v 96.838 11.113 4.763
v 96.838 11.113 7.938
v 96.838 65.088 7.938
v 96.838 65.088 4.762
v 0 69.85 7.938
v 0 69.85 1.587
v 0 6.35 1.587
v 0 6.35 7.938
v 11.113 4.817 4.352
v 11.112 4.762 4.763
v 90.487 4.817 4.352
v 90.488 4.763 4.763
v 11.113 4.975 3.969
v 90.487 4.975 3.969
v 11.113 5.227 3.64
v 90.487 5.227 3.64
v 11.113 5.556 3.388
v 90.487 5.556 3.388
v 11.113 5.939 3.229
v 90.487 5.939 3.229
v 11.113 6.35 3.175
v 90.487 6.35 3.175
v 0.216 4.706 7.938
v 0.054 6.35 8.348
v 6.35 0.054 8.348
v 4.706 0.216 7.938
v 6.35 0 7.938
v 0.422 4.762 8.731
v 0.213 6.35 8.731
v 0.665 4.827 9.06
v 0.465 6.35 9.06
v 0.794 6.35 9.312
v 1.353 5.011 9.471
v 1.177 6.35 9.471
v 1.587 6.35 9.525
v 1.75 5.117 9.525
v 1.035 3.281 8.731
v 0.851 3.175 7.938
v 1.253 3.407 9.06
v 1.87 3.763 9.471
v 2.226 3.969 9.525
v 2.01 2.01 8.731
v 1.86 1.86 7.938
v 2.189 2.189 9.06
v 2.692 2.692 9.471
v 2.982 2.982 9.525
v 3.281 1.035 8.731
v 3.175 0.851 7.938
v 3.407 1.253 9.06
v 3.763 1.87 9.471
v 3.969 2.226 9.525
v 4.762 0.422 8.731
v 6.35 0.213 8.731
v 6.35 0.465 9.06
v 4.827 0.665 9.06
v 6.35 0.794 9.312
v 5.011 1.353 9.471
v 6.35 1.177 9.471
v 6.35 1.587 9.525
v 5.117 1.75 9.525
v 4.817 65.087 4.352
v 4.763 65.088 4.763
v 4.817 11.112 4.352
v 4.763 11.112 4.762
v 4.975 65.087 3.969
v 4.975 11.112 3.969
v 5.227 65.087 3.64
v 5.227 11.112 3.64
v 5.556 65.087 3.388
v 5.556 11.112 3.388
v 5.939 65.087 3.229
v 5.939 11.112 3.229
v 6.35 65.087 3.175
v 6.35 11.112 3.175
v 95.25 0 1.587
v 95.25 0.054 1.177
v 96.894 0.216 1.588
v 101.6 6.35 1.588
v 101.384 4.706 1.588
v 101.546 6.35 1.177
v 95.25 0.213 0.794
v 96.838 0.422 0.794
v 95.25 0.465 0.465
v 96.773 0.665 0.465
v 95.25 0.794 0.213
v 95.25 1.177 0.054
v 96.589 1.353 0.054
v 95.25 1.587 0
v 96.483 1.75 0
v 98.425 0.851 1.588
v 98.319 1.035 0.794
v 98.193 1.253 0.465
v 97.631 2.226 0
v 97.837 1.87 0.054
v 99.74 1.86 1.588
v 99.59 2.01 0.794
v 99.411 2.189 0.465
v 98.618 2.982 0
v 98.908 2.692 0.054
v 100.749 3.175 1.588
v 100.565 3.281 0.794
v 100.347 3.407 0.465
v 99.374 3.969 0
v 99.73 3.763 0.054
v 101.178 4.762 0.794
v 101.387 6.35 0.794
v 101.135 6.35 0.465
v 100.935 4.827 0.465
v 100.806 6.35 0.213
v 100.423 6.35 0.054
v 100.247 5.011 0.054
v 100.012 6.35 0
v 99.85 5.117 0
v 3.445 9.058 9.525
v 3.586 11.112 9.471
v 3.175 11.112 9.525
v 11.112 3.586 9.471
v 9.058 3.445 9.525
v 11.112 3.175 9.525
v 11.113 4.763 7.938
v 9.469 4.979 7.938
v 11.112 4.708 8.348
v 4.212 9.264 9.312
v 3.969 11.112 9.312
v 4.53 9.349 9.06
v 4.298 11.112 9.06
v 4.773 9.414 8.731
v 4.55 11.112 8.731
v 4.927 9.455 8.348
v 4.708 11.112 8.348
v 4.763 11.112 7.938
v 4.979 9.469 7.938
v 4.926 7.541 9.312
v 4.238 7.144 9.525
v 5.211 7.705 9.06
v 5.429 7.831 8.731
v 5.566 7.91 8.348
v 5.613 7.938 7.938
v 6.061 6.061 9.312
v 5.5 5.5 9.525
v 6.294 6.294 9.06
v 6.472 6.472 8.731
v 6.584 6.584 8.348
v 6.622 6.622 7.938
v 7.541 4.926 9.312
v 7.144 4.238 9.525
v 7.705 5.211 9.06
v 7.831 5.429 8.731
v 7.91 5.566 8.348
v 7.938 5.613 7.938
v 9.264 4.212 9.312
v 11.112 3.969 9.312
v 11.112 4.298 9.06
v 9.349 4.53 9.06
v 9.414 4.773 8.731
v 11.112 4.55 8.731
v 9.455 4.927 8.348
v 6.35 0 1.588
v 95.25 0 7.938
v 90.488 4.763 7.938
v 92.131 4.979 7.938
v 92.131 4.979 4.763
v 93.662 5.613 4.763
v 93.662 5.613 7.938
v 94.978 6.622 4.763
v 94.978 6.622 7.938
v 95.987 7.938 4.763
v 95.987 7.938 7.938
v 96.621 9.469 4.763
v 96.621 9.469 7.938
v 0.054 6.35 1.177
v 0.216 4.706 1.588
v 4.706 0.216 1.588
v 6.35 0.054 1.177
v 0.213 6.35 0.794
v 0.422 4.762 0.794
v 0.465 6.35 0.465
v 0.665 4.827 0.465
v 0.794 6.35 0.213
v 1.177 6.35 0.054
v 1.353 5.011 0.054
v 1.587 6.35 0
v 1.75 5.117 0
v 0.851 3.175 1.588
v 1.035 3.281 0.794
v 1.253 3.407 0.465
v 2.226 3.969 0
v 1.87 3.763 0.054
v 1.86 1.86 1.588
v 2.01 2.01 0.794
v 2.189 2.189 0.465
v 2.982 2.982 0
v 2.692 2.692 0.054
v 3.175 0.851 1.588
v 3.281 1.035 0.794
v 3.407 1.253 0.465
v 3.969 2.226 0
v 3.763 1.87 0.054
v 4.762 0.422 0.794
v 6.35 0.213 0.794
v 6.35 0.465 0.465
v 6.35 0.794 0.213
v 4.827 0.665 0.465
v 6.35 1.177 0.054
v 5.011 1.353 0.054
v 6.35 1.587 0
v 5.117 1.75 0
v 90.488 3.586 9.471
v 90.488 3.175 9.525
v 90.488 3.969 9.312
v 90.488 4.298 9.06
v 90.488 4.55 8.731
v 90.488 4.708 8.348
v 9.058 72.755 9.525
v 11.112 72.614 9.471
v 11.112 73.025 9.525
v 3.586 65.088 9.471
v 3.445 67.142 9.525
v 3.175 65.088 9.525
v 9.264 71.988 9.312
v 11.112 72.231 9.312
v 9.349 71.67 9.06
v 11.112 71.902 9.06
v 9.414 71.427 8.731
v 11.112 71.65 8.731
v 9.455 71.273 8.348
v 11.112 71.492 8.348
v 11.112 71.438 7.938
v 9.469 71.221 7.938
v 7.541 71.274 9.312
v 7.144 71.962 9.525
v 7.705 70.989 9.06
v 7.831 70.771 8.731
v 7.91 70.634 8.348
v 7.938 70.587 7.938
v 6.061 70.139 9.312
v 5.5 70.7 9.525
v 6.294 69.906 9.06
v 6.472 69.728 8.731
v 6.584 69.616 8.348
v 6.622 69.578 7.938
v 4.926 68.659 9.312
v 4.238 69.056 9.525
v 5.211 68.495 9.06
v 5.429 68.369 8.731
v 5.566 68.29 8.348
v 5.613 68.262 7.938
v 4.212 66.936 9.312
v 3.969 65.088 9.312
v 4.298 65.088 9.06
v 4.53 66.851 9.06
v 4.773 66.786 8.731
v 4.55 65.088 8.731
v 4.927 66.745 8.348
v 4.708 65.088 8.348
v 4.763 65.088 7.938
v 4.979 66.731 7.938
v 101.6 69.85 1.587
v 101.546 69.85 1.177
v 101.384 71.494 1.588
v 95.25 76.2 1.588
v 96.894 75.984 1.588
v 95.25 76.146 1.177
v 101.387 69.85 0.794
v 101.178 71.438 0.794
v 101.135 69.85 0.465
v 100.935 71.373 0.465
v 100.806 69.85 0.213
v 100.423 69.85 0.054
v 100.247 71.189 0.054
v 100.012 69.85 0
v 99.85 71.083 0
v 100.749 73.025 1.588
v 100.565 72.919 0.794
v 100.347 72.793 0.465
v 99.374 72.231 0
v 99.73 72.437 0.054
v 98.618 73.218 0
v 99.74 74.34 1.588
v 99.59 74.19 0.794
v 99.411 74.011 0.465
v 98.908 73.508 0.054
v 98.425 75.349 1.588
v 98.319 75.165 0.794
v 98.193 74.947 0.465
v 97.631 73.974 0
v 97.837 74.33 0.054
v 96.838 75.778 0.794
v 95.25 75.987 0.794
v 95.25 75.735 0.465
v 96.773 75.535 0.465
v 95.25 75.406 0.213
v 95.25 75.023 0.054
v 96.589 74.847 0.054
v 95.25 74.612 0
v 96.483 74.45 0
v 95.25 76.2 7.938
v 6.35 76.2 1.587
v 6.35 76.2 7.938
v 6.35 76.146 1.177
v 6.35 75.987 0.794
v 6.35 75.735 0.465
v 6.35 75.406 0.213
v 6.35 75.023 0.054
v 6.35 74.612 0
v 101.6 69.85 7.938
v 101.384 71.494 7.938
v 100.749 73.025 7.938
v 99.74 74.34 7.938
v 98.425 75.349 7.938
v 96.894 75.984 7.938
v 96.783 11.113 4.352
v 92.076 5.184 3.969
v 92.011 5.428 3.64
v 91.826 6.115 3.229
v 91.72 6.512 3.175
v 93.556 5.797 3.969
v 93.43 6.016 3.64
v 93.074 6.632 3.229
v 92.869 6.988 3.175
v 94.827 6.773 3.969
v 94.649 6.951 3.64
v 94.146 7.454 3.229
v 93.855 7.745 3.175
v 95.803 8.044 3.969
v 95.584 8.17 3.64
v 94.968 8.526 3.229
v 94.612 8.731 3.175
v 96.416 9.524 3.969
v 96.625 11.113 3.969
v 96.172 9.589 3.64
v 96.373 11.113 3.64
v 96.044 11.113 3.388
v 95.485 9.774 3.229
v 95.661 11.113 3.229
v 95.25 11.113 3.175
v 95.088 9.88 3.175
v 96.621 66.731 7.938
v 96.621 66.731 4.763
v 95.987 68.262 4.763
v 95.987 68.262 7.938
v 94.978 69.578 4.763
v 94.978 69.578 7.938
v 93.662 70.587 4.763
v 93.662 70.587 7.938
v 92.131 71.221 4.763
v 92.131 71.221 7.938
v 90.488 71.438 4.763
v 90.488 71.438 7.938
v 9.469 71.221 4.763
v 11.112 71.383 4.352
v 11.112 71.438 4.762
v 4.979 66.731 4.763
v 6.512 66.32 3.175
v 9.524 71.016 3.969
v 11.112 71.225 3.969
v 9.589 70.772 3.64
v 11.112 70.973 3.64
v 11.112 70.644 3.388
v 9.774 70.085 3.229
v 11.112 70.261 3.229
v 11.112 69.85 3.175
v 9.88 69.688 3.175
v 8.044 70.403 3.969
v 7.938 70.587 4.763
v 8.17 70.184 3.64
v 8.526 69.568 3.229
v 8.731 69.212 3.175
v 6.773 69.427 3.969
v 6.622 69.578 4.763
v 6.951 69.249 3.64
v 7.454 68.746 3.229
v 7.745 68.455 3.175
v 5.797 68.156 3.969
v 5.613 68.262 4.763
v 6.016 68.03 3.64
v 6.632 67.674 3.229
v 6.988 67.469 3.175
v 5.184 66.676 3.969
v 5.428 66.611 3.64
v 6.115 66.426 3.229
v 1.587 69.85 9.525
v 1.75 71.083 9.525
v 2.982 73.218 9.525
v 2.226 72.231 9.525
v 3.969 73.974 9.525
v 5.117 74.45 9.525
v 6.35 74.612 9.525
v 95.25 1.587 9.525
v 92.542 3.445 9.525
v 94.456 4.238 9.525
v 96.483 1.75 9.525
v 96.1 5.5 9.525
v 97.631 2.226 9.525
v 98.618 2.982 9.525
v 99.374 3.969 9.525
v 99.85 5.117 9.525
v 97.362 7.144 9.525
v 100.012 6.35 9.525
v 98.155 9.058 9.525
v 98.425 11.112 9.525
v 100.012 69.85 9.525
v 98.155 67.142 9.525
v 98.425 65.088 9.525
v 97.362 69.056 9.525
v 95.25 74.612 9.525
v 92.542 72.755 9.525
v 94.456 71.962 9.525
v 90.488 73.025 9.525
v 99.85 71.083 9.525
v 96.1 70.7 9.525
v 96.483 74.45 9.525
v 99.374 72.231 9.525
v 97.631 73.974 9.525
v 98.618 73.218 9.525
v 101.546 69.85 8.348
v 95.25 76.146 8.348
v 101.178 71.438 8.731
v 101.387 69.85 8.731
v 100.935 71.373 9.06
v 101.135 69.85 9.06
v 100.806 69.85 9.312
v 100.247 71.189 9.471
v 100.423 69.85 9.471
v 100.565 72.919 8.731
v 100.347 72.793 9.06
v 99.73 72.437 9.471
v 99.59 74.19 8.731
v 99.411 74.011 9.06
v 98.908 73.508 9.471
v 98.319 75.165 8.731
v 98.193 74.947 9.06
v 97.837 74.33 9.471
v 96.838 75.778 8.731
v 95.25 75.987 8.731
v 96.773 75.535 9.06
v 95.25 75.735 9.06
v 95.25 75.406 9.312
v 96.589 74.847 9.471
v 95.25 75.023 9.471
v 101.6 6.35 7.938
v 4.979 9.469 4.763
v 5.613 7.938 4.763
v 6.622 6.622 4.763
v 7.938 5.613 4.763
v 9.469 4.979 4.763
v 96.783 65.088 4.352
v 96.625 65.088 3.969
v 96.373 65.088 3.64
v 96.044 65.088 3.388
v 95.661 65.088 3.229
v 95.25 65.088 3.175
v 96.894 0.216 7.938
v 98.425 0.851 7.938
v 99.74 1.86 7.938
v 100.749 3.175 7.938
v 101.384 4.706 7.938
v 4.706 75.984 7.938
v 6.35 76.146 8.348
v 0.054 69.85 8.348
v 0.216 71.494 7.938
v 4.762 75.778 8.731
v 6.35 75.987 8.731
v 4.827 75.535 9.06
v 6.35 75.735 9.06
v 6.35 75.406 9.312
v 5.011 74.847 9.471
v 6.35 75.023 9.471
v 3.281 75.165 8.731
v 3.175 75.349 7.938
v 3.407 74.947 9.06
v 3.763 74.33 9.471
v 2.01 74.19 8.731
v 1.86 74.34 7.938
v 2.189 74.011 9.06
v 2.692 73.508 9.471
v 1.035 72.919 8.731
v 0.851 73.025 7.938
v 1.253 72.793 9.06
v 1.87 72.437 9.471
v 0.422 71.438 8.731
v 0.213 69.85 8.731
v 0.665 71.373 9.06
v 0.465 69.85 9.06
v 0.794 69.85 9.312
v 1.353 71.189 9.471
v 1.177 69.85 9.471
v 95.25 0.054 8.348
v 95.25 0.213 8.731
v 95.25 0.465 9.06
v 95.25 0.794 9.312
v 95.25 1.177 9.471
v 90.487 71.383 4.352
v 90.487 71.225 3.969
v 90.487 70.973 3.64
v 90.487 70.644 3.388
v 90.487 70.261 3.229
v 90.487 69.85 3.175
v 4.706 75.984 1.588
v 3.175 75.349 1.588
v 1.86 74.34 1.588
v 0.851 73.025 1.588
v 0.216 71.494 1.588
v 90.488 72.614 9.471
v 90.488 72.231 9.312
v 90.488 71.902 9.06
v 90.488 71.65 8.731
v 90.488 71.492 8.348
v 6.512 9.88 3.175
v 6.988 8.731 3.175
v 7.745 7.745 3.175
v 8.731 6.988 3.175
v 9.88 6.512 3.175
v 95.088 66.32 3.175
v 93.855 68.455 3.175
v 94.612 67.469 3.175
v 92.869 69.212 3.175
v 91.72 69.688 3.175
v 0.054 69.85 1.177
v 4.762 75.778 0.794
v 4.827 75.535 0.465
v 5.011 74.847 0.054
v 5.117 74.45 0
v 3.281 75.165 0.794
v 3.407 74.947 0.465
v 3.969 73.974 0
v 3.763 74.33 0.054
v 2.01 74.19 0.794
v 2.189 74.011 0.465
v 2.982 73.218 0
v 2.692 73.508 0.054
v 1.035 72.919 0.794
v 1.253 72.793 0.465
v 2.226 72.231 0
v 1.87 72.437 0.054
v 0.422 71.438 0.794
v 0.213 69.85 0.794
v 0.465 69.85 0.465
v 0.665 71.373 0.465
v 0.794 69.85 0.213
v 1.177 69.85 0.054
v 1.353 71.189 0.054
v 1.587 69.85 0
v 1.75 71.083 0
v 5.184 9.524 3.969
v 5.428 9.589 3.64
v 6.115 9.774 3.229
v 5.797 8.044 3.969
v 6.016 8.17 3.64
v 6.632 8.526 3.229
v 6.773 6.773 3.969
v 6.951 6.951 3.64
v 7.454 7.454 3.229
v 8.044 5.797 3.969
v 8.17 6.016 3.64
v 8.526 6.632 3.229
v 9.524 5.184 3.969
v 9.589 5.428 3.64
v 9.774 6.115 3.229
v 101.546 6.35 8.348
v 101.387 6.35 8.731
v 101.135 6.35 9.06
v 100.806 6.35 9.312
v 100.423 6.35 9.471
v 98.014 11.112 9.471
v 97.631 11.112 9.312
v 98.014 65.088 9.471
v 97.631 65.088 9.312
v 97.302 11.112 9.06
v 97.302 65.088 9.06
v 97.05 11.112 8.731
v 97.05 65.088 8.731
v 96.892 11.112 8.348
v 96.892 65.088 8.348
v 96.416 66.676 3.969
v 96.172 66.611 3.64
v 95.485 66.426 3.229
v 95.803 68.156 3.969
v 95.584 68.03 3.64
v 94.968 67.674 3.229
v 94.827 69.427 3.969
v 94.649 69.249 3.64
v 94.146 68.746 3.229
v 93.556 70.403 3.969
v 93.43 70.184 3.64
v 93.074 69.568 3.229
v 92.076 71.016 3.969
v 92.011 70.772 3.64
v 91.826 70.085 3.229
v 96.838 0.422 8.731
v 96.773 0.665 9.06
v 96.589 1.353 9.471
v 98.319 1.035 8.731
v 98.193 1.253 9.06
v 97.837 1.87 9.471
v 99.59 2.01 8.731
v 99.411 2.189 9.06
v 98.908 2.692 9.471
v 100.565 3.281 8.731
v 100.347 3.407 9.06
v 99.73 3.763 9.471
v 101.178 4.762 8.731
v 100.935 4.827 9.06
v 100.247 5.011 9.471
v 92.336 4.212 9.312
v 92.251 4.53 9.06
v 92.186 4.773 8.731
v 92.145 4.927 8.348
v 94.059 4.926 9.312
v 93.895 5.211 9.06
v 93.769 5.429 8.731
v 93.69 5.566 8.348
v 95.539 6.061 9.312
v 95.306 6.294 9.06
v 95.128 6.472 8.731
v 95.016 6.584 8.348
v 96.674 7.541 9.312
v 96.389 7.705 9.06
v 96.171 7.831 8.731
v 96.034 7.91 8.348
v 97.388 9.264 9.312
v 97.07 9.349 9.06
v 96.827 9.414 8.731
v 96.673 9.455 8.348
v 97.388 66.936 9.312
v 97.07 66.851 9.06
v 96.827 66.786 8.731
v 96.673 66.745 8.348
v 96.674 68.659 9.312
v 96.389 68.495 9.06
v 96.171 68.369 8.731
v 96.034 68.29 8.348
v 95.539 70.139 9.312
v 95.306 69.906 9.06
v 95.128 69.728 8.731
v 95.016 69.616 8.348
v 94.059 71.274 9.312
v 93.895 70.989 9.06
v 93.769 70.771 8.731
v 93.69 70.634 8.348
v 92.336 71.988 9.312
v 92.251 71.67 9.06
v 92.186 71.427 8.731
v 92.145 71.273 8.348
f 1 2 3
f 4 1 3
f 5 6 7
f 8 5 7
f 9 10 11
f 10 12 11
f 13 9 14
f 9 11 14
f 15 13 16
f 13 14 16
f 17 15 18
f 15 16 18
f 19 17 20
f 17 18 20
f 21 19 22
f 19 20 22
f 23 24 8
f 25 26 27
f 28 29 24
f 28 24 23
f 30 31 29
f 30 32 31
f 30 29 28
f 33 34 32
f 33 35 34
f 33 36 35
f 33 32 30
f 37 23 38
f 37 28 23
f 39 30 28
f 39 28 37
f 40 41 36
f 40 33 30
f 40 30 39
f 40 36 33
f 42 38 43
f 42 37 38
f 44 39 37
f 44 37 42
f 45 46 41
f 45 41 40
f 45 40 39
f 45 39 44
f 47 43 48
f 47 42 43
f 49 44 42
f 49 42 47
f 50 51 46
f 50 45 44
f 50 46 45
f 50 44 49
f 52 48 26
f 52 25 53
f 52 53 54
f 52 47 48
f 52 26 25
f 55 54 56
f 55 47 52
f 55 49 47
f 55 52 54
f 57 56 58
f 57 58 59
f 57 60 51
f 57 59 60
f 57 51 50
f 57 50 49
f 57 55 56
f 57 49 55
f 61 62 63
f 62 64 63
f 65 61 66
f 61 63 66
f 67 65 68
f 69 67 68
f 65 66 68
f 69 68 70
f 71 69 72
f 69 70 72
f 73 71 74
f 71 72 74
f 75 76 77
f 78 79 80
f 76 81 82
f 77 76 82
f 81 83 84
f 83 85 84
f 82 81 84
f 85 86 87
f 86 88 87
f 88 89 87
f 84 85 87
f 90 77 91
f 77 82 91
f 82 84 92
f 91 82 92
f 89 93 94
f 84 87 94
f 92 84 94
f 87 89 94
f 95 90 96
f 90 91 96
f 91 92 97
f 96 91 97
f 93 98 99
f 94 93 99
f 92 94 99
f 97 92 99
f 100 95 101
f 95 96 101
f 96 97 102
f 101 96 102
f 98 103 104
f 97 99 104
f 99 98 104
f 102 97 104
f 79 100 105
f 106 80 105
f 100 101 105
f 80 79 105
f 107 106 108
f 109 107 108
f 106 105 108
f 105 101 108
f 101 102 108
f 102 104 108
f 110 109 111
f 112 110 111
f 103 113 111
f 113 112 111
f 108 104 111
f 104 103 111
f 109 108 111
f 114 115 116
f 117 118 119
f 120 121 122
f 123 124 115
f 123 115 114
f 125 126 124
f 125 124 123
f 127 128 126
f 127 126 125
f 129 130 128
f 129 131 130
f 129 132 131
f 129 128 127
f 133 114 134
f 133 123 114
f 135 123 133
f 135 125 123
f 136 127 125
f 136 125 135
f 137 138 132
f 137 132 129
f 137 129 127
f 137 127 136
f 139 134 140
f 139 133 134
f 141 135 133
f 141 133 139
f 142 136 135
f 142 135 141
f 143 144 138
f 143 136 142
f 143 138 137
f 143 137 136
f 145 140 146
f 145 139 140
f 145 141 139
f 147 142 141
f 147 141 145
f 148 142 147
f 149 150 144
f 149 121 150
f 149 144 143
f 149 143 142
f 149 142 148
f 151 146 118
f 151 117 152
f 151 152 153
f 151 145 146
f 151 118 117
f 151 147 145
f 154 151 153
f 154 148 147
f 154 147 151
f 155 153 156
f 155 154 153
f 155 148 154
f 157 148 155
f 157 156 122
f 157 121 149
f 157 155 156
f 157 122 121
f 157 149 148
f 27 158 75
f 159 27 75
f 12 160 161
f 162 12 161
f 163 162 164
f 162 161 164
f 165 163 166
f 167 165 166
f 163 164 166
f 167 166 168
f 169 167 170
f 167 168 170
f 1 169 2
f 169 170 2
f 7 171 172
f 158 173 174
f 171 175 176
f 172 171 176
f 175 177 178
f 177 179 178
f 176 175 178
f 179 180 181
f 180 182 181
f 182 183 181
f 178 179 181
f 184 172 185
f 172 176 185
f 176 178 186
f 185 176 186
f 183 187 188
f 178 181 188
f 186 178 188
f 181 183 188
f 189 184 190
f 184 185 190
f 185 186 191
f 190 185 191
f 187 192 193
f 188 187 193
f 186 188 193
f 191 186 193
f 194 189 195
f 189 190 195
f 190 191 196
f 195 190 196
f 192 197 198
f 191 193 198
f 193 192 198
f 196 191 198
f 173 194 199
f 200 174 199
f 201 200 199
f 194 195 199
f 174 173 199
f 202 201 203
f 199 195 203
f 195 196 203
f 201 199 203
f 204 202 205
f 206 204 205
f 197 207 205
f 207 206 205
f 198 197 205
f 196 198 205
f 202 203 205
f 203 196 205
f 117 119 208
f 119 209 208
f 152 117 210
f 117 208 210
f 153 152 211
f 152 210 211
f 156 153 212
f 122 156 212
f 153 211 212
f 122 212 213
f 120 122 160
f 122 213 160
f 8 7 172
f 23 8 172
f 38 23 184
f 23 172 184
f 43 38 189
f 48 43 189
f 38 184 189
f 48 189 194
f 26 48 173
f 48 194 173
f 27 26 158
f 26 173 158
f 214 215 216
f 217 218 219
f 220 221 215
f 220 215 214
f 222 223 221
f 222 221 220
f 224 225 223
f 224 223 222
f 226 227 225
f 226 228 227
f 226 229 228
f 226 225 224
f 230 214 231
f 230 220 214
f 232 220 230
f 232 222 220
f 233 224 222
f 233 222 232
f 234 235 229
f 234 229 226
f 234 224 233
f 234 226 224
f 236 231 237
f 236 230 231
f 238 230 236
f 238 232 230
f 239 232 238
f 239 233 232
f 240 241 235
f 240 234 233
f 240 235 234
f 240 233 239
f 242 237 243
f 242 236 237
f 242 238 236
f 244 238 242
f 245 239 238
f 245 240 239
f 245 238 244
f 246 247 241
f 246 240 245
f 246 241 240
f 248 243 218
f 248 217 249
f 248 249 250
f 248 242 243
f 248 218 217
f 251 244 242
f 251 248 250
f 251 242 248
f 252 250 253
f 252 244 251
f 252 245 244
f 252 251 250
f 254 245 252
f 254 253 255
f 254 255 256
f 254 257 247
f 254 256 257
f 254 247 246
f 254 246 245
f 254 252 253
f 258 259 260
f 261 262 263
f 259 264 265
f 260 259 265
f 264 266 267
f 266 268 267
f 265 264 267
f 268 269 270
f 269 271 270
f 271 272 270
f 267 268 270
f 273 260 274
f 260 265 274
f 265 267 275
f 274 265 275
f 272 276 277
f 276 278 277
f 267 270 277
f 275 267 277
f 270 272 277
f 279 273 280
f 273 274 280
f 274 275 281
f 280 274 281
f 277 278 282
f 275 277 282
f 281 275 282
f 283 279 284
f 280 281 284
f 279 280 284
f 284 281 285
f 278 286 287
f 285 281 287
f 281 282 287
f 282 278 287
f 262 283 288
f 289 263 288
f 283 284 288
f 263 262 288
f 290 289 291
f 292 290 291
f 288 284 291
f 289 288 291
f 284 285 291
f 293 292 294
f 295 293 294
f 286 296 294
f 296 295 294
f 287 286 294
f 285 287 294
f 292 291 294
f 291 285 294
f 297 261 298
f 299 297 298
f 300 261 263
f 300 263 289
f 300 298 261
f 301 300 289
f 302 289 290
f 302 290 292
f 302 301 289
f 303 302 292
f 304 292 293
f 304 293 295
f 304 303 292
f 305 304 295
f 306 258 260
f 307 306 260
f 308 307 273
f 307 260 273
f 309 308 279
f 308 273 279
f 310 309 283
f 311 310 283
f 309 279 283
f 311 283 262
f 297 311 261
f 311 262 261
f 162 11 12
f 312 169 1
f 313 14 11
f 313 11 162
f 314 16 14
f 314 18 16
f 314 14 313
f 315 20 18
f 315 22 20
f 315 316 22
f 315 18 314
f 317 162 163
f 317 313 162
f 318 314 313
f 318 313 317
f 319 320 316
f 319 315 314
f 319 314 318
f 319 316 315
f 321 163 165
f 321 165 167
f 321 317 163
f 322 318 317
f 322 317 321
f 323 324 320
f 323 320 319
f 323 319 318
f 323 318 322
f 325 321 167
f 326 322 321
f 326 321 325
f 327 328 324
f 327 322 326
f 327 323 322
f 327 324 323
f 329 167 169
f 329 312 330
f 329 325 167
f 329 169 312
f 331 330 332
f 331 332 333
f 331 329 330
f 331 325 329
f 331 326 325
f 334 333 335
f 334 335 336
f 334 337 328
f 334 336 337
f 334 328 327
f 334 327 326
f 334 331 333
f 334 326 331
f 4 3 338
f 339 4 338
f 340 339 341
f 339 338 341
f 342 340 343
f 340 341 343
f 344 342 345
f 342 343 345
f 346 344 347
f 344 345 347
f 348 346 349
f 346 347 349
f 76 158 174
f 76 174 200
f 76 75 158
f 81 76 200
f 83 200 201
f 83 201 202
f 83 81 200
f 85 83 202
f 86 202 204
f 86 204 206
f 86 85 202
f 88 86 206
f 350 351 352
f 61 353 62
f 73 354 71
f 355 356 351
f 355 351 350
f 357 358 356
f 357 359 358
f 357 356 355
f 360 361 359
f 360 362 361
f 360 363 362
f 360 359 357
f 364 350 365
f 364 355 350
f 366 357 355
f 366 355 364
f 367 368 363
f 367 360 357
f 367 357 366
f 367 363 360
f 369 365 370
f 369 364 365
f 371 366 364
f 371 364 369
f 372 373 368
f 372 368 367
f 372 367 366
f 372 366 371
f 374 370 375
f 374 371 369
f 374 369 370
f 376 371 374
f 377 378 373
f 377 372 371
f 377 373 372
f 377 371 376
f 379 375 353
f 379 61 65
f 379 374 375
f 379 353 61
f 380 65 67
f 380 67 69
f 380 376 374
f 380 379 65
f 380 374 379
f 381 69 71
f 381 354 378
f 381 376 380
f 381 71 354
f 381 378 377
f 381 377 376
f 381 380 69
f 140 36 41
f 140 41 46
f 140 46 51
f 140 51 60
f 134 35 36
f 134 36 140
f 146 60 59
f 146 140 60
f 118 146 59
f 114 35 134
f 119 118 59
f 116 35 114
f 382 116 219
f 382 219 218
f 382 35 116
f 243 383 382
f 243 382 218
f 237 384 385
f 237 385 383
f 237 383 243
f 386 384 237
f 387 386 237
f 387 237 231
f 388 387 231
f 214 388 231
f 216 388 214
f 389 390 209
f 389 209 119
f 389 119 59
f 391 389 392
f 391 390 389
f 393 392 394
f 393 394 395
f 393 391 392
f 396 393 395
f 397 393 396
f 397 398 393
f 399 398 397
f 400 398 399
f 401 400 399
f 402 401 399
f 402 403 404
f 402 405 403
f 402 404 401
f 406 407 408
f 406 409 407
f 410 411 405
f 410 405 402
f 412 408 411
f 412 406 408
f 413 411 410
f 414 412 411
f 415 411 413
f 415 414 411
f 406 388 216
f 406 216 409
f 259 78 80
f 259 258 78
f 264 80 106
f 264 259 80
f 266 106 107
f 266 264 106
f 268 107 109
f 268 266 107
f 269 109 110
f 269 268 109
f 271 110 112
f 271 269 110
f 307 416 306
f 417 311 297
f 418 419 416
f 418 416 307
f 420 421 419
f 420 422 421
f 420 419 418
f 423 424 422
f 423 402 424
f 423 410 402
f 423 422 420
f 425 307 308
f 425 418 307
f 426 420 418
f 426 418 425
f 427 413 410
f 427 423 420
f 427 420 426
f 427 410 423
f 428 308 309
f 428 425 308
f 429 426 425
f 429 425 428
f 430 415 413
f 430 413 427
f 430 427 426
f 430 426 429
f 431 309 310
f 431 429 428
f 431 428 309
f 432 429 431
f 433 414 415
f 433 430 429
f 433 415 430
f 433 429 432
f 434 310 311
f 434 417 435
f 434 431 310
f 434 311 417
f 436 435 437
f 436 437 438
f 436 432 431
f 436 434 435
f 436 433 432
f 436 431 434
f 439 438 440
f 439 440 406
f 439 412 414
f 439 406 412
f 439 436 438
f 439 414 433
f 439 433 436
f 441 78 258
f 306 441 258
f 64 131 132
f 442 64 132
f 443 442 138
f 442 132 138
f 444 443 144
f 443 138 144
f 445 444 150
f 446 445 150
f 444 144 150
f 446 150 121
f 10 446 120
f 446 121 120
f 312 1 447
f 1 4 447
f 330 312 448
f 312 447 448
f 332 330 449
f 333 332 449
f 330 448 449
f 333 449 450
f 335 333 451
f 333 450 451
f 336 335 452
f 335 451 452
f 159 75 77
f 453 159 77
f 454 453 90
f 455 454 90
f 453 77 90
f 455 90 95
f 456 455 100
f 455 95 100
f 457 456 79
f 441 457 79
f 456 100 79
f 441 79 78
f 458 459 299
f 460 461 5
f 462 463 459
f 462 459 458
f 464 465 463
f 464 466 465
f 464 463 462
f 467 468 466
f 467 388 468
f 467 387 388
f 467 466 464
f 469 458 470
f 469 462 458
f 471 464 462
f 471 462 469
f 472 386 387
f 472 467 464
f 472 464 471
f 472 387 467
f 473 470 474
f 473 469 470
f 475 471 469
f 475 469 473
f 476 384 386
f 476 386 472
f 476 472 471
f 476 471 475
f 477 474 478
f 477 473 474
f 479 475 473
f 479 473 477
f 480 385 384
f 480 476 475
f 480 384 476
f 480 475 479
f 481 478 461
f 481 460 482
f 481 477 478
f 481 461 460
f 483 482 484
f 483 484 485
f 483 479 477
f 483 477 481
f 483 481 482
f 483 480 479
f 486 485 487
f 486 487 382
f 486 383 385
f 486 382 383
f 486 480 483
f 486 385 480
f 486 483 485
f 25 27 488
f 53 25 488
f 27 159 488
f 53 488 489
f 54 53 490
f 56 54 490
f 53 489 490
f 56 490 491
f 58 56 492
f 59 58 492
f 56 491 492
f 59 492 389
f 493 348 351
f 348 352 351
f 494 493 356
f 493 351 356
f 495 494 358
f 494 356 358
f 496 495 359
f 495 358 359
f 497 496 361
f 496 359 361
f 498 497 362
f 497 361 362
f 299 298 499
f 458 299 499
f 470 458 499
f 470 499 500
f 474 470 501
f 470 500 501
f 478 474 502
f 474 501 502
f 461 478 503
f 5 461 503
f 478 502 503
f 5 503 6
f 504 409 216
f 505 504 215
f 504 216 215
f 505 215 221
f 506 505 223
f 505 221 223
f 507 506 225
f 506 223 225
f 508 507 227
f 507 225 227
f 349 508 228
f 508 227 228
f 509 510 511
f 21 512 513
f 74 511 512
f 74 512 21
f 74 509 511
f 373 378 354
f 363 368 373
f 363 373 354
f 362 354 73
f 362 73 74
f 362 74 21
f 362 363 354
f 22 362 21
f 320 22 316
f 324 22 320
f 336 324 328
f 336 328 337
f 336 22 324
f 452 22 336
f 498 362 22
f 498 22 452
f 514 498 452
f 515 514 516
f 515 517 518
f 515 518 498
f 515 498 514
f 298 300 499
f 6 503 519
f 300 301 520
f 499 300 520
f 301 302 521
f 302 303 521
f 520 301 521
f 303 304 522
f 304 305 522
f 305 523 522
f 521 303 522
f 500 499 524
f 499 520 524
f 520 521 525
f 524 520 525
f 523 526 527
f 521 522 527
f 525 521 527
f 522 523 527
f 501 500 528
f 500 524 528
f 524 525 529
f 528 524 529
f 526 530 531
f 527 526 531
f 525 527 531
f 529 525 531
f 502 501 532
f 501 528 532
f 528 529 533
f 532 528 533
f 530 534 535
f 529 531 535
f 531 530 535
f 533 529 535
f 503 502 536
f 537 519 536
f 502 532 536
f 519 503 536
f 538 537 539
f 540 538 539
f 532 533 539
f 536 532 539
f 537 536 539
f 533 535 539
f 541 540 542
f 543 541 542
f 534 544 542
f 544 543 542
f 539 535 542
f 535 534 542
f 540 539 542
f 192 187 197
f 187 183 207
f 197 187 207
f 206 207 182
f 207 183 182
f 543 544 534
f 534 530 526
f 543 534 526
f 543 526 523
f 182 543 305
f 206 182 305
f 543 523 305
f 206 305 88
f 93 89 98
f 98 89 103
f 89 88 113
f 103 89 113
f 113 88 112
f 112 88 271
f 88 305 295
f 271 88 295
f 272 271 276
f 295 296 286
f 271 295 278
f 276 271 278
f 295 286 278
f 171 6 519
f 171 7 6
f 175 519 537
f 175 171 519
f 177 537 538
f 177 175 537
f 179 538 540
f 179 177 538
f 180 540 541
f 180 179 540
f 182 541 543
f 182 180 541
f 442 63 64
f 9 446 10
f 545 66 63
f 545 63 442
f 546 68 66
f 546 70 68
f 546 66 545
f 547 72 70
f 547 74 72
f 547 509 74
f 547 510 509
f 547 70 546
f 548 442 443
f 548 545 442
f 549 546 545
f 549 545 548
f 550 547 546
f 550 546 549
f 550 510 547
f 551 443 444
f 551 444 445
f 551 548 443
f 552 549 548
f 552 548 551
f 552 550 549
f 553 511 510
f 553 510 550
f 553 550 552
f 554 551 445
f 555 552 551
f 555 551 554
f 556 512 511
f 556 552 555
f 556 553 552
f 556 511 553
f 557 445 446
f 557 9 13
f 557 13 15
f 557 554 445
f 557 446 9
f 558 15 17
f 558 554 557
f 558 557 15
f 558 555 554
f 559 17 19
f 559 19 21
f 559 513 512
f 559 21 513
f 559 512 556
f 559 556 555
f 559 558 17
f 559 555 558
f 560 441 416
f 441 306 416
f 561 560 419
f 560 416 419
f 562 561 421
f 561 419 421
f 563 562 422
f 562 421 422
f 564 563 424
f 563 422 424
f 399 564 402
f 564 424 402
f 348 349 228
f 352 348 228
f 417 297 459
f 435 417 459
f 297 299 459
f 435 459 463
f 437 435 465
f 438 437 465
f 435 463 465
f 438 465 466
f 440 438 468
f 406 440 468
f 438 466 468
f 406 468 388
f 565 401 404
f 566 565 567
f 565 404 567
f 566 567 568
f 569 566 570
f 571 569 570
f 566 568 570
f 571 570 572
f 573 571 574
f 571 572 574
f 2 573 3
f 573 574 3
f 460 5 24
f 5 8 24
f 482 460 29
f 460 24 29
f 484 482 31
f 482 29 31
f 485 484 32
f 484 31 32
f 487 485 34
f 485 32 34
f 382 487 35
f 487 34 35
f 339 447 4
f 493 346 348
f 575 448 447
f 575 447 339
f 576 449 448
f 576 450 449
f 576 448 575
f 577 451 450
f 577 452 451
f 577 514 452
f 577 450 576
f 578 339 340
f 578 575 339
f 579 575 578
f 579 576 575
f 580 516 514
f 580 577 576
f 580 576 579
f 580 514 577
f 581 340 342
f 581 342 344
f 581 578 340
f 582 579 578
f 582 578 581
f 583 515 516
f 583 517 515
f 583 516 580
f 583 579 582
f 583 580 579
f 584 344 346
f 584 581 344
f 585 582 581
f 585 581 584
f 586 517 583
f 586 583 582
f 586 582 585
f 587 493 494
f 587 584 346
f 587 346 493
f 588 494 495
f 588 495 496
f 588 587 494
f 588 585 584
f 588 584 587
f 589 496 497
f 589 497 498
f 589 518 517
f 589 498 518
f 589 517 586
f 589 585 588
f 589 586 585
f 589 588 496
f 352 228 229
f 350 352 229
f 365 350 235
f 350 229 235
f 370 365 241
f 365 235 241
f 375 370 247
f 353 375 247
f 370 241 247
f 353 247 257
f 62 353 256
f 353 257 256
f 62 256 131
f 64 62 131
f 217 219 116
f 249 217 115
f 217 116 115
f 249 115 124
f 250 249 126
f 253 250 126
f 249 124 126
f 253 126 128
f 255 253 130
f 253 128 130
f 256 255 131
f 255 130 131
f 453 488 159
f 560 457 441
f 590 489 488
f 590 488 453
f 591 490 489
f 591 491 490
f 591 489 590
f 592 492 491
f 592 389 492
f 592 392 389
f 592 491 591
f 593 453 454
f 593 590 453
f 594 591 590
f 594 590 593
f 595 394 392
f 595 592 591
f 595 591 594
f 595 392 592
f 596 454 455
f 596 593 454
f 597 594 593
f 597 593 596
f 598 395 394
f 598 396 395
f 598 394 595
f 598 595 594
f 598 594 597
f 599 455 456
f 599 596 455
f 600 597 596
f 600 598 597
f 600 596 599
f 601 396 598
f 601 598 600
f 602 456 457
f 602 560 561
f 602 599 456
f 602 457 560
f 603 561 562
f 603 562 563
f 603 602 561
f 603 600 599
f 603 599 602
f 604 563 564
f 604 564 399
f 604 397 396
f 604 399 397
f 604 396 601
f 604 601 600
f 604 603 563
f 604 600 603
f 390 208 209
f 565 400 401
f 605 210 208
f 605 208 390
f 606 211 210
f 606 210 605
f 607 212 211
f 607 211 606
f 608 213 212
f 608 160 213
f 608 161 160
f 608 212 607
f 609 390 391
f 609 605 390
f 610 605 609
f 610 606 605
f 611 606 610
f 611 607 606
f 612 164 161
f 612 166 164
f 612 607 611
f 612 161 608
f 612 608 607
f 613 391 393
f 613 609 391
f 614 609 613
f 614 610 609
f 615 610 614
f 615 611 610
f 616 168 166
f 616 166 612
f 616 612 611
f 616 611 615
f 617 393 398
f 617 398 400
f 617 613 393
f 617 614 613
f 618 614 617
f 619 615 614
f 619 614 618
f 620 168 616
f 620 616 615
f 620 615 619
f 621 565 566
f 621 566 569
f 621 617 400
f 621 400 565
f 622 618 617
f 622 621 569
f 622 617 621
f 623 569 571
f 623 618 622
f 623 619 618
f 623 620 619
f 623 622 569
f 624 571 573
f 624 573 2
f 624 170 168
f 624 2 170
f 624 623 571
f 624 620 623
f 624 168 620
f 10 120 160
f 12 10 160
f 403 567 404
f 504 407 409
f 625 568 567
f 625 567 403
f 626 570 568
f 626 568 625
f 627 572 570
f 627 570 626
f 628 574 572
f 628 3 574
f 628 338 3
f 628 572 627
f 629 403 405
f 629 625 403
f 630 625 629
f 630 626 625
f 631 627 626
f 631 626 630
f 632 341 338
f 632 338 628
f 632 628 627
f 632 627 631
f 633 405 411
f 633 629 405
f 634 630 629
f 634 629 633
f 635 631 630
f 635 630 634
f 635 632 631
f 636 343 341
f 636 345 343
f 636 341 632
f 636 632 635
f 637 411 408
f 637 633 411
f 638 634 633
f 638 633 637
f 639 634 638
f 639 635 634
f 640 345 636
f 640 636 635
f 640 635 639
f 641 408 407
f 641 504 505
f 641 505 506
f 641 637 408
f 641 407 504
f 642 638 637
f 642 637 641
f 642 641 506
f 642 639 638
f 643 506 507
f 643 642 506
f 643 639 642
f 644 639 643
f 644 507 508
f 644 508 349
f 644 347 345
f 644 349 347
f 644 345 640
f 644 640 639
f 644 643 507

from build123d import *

# Parameters (mm, degrees)
F1_DEPTH = 9.525
F3_DEPTH = 6.35
F4_R     = 1.5875
F5_R     = 1.5875


with BuildPart() as f1:
    # F0 (on Top) → F1 (new body)
    with BuildSketch(Plane.XY):
        with BuildLine():
            ThreePointArc((0, 6.35), (1.8598719395, 1.8598719395), (6.35, 0))
            Line((6.35, 0), (95.25, 0))
            ThreePointArc((95.25, 0), (99.7401280605, 1.8598719395), (101.6, 6.35))
            Line((101.6, 6.35), (101.6, 69.85))
            ThreePointArc((101.6, 69.85), (99.7401280605, 74.3401280605), (95.25, 76.2))
            Line((95.25, 76.2), (6.35, 76.2))
            ThreePointArc((6.35, 76.2), (1.8598719395, 74.3401280605), (0, 69.85))
            Line((0, 69.85), (0, 6.35))
        make_face()
    extrude(amount=F1_DEPTH)

    # F2 (on face) → F3 (cut)
    with BuildSketch(Plane.XY.offset(9.525)):
        with BuildLine():
            ThreePointArc((96.8375, 65.0875), (94.9776280605, 69.5776280605), (90.4875, 71.4375))
            Line((90.4875, 71.4375), (11.1125, 71.4375))
            ThreePointArc((11.1125, 71.4375), (6.6223719395, 69.5776280605), (4.7625, 65.0875))
            Line((4.7625, 65.0875), (4.7625, 11.1125))
            ThreePointArc((4.7625, 11.1125), (6.6223719395, 6.6223719395), (11.1125, 4.7625))
            Line((11.1125, 4.7625), (90.4875, 4.7625))
            ThreePointArc((90.4875, 4.7625), (94.9776280605, 6.6223719395), (96.8375, 11.1125))
            Line((96.8375, 11.1125), (96.8375, 65.0875))
        make_face()
    extrude(amount=-F3_DEPTH, mode=Mode.SUBTRACT)

    # F4
    f4_edges = [f1.edges().sort_by_distance(p)[0] for p in [
        (0, 38.1, 9.525),
        (1.859872, 74.340128, 9.525),
        (1.859872, 1.859872, 9.525),
        (50.8, 76.2, 9.525),
        (50.8, 0, 9.525),
        (99.740128, 74.340128, 9.525),
        (99.740128, 1.859872, 9.525),
        (101.6, 38.1, 9.525),
        (94.977628, 6.622372, 9.525),
        (96.8375, 38.1, 9.525),
        (94.977628, 69.577628, 9.525),
        (50.8, 71.4375, 9.525),
        (6.622372, 69.577628, 9.525),
        (4.7625, 38.1, 9.525),
        (6.622372, 6.622372, 9.525),
        (50.8, 4.7625, 9.525),
        (0, 38.1, 0),
        (1.859872, 1.859872, 0),
        (50.8, 0, 0),
        (99.740128, 1.859872, 0),
        (101.6, 38.1, 0),
        (99.740128, 74.340128, 0),
        (50.8, 76.2, 0),
        (1.859872, 74.340128, 0),
    ]]
    fillet(f4_edges, radius=F4_R)

    # F5
    f5_edges = [f1.edges().sort_by_distance(p)[0] for p in [
        (94.977628, 6.622372, 3.175),
        (96.8375, 38.1, 3.175),
        (94.977628, 69.577628, 3.175),
        (50.8, 71.4375, 3.175),
        (6.622372, 69.577628, 3.175),
        (4.7625, 38.1, 3.175),
        (6.622372, 6.622372, 3.175),
        (50.8, 4.7625, 3.175),
    ]]
    fillet(f5_edges, radius=F5_R)


solid = f1.part
